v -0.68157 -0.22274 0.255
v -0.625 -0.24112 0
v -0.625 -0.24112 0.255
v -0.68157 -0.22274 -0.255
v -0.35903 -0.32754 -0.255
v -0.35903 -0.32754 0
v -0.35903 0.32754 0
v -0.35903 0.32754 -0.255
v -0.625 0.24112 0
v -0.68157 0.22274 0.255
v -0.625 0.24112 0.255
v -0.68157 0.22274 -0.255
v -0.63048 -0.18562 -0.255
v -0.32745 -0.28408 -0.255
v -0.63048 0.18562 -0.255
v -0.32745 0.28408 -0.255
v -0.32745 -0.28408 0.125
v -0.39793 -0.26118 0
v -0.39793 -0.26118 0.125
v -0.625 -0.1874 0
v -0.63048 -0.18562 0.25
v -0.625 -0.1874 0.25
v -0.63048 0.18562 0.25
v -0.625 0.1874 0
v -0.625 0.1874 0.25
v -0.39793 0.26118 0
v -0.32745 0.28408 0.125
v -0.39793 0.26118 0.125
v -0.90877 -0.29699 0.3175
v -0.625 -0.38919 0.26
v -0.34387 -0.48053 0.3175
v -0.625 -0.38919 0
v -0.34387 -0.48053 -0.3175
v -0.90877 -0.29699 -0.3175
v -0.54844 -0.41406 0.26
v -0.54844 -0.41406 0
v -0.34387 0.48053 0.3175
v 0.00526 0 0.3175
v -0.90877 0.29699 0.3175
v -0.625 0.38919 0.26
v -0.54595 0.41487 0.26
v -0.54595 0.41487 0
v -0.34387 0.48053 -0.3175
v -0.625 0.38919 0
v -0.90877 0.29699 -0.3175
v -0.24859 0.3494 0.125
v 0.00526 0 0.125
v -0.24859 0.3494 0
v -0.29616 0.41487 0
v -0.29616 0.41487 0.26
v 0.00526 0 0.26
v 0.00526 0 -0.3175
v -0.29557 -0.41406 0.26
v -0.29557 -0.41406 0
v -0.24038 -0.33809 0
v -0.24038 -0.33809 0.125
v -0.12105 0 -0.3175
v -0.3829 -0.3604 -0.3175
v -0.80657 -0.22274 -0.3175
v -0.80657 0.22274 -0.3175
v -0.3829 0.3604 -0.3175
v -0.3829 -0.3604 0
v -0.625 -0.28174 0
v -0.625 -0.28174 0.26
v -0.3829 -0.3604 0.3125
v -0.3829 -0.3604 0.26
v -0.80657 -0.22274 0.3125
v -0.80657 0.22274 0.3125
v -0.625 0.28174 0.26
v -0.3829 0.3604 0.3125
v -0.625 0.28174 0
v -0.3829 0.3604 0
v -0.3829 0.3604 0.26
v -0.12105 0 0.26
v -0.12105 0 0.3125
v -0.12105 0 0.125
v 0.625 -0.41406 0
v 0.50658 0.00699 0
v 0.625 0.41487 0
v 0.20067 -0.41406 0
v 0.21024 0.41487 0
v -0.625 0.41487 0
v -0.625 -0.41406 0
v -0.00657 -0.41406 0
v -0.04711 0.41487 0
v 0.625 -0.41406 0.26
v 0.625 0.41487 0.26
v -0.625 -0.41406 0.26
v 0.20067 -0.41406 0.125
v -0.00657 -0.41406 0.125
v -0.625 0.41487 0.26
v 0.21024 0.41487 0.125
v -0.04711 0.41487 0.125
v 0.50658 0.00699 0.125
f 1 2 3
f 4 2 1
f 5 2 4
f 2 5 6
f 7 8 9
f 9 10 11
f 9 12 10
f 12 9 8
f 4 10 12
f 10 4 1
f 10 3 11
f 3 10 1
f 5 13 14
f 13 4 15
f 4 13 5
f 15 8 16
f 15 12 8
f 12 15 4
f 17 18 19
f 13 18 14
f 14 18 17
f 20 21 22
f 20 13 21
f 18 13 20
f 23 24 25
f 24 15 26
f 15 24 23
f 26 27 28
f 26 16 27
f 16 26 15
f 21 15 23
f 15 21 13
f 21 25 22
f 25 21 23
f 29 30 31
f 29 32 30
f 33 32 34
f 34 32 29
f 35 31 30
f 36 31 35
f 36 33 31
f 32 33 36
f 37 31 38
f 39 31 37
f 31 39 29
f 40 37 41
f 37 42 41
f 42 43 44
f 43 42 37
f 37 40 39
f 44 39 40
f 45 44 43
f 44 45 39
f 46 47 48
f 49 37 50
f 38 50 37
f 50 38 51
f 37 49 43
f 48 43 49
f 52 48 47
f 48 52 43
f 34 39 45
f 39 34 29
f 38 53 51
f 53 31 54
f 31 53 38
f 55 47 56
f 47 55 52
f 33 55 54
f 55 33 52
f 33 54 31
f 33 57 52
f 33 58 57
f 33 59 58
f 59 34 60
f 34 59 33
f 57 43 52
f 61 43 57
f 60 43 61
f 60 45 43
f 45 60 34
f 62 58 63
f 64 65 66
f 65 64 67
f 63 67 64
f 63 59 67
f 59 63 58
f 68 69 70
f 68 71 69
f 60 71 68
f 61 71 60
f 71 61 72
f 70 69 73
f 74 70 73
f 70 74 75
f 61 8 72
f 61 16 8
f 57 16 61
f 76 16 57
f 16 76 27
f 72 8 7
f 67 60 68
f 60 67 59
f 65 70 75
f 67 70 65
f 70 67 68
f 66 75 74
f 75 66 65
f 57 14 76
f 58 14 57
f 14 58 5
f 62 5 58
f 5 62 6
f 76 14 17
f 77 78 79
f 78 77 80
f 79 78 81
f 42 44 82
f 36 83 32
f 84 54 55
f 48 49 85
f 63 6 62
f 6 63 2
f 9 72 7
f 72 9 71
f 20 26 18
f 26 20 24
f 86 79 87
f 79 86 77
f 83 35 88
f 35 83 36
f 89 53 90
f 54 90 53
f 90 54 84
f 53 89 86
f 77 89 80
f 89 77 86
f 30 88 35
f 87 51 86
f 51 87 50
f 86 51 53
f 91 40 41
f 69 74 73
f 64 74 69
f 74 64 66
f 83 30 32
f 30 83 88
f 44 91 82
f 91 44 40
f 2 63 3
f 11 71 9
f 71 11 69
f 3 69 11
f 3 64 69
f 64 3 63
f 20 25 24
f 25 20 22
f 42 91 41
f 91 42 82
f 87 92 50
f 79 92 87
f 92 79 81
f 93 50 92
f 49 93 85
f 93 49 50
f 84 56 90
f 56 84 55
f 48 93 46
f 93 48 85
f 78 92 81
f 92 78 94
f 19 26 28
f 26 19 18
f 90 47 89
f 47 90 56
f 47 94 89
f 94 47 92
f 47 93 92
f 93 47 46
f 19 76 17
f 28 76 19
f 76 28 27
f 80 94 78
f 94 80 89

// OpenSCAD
EPS = 0.01;

module loop0() {
    difference() {
        cylinder(h=0.5 + EPS, r=0.37894736842105264, center=true);
        translate([0, 0, -EPS/2])
            cylinder(h=0.5 + EPS, r=0.3157894736842105, center=true);
    }
}

module loop1() {
    difference() {
        cylinder(h=0.625 + EPS, r=0.5052631578947369, center=true);
        translate([0, 0, -EPS/2])
            cylinder(h=0.625 + EPS, r=0.37894736842105264, center=true);
    }
}

module loop2() {
    difference() {
        linear_extrude(height=0.25 + EPS) {
            polygon(points=[
                [0, 0],
                [1.25, 0],
                [1.25, 0.8289473684210525],
                [0, 0.8289473684210525],
                [0, 0]
            ], paths=[[0, 1, 2, 3, 4]]);
        }
        translate([0.631578947368421, 0.42105263157894735, -EPS/2])
            cylinder(h=0.25 + EPS, r=0.5, center=true);
    }
}

translate([-0.375, 0, 0])
    loop0();

translate([-0.5, 0, 0])
    loop1();

translate([-0.625, -0.4140625, 0])
    loop2();
